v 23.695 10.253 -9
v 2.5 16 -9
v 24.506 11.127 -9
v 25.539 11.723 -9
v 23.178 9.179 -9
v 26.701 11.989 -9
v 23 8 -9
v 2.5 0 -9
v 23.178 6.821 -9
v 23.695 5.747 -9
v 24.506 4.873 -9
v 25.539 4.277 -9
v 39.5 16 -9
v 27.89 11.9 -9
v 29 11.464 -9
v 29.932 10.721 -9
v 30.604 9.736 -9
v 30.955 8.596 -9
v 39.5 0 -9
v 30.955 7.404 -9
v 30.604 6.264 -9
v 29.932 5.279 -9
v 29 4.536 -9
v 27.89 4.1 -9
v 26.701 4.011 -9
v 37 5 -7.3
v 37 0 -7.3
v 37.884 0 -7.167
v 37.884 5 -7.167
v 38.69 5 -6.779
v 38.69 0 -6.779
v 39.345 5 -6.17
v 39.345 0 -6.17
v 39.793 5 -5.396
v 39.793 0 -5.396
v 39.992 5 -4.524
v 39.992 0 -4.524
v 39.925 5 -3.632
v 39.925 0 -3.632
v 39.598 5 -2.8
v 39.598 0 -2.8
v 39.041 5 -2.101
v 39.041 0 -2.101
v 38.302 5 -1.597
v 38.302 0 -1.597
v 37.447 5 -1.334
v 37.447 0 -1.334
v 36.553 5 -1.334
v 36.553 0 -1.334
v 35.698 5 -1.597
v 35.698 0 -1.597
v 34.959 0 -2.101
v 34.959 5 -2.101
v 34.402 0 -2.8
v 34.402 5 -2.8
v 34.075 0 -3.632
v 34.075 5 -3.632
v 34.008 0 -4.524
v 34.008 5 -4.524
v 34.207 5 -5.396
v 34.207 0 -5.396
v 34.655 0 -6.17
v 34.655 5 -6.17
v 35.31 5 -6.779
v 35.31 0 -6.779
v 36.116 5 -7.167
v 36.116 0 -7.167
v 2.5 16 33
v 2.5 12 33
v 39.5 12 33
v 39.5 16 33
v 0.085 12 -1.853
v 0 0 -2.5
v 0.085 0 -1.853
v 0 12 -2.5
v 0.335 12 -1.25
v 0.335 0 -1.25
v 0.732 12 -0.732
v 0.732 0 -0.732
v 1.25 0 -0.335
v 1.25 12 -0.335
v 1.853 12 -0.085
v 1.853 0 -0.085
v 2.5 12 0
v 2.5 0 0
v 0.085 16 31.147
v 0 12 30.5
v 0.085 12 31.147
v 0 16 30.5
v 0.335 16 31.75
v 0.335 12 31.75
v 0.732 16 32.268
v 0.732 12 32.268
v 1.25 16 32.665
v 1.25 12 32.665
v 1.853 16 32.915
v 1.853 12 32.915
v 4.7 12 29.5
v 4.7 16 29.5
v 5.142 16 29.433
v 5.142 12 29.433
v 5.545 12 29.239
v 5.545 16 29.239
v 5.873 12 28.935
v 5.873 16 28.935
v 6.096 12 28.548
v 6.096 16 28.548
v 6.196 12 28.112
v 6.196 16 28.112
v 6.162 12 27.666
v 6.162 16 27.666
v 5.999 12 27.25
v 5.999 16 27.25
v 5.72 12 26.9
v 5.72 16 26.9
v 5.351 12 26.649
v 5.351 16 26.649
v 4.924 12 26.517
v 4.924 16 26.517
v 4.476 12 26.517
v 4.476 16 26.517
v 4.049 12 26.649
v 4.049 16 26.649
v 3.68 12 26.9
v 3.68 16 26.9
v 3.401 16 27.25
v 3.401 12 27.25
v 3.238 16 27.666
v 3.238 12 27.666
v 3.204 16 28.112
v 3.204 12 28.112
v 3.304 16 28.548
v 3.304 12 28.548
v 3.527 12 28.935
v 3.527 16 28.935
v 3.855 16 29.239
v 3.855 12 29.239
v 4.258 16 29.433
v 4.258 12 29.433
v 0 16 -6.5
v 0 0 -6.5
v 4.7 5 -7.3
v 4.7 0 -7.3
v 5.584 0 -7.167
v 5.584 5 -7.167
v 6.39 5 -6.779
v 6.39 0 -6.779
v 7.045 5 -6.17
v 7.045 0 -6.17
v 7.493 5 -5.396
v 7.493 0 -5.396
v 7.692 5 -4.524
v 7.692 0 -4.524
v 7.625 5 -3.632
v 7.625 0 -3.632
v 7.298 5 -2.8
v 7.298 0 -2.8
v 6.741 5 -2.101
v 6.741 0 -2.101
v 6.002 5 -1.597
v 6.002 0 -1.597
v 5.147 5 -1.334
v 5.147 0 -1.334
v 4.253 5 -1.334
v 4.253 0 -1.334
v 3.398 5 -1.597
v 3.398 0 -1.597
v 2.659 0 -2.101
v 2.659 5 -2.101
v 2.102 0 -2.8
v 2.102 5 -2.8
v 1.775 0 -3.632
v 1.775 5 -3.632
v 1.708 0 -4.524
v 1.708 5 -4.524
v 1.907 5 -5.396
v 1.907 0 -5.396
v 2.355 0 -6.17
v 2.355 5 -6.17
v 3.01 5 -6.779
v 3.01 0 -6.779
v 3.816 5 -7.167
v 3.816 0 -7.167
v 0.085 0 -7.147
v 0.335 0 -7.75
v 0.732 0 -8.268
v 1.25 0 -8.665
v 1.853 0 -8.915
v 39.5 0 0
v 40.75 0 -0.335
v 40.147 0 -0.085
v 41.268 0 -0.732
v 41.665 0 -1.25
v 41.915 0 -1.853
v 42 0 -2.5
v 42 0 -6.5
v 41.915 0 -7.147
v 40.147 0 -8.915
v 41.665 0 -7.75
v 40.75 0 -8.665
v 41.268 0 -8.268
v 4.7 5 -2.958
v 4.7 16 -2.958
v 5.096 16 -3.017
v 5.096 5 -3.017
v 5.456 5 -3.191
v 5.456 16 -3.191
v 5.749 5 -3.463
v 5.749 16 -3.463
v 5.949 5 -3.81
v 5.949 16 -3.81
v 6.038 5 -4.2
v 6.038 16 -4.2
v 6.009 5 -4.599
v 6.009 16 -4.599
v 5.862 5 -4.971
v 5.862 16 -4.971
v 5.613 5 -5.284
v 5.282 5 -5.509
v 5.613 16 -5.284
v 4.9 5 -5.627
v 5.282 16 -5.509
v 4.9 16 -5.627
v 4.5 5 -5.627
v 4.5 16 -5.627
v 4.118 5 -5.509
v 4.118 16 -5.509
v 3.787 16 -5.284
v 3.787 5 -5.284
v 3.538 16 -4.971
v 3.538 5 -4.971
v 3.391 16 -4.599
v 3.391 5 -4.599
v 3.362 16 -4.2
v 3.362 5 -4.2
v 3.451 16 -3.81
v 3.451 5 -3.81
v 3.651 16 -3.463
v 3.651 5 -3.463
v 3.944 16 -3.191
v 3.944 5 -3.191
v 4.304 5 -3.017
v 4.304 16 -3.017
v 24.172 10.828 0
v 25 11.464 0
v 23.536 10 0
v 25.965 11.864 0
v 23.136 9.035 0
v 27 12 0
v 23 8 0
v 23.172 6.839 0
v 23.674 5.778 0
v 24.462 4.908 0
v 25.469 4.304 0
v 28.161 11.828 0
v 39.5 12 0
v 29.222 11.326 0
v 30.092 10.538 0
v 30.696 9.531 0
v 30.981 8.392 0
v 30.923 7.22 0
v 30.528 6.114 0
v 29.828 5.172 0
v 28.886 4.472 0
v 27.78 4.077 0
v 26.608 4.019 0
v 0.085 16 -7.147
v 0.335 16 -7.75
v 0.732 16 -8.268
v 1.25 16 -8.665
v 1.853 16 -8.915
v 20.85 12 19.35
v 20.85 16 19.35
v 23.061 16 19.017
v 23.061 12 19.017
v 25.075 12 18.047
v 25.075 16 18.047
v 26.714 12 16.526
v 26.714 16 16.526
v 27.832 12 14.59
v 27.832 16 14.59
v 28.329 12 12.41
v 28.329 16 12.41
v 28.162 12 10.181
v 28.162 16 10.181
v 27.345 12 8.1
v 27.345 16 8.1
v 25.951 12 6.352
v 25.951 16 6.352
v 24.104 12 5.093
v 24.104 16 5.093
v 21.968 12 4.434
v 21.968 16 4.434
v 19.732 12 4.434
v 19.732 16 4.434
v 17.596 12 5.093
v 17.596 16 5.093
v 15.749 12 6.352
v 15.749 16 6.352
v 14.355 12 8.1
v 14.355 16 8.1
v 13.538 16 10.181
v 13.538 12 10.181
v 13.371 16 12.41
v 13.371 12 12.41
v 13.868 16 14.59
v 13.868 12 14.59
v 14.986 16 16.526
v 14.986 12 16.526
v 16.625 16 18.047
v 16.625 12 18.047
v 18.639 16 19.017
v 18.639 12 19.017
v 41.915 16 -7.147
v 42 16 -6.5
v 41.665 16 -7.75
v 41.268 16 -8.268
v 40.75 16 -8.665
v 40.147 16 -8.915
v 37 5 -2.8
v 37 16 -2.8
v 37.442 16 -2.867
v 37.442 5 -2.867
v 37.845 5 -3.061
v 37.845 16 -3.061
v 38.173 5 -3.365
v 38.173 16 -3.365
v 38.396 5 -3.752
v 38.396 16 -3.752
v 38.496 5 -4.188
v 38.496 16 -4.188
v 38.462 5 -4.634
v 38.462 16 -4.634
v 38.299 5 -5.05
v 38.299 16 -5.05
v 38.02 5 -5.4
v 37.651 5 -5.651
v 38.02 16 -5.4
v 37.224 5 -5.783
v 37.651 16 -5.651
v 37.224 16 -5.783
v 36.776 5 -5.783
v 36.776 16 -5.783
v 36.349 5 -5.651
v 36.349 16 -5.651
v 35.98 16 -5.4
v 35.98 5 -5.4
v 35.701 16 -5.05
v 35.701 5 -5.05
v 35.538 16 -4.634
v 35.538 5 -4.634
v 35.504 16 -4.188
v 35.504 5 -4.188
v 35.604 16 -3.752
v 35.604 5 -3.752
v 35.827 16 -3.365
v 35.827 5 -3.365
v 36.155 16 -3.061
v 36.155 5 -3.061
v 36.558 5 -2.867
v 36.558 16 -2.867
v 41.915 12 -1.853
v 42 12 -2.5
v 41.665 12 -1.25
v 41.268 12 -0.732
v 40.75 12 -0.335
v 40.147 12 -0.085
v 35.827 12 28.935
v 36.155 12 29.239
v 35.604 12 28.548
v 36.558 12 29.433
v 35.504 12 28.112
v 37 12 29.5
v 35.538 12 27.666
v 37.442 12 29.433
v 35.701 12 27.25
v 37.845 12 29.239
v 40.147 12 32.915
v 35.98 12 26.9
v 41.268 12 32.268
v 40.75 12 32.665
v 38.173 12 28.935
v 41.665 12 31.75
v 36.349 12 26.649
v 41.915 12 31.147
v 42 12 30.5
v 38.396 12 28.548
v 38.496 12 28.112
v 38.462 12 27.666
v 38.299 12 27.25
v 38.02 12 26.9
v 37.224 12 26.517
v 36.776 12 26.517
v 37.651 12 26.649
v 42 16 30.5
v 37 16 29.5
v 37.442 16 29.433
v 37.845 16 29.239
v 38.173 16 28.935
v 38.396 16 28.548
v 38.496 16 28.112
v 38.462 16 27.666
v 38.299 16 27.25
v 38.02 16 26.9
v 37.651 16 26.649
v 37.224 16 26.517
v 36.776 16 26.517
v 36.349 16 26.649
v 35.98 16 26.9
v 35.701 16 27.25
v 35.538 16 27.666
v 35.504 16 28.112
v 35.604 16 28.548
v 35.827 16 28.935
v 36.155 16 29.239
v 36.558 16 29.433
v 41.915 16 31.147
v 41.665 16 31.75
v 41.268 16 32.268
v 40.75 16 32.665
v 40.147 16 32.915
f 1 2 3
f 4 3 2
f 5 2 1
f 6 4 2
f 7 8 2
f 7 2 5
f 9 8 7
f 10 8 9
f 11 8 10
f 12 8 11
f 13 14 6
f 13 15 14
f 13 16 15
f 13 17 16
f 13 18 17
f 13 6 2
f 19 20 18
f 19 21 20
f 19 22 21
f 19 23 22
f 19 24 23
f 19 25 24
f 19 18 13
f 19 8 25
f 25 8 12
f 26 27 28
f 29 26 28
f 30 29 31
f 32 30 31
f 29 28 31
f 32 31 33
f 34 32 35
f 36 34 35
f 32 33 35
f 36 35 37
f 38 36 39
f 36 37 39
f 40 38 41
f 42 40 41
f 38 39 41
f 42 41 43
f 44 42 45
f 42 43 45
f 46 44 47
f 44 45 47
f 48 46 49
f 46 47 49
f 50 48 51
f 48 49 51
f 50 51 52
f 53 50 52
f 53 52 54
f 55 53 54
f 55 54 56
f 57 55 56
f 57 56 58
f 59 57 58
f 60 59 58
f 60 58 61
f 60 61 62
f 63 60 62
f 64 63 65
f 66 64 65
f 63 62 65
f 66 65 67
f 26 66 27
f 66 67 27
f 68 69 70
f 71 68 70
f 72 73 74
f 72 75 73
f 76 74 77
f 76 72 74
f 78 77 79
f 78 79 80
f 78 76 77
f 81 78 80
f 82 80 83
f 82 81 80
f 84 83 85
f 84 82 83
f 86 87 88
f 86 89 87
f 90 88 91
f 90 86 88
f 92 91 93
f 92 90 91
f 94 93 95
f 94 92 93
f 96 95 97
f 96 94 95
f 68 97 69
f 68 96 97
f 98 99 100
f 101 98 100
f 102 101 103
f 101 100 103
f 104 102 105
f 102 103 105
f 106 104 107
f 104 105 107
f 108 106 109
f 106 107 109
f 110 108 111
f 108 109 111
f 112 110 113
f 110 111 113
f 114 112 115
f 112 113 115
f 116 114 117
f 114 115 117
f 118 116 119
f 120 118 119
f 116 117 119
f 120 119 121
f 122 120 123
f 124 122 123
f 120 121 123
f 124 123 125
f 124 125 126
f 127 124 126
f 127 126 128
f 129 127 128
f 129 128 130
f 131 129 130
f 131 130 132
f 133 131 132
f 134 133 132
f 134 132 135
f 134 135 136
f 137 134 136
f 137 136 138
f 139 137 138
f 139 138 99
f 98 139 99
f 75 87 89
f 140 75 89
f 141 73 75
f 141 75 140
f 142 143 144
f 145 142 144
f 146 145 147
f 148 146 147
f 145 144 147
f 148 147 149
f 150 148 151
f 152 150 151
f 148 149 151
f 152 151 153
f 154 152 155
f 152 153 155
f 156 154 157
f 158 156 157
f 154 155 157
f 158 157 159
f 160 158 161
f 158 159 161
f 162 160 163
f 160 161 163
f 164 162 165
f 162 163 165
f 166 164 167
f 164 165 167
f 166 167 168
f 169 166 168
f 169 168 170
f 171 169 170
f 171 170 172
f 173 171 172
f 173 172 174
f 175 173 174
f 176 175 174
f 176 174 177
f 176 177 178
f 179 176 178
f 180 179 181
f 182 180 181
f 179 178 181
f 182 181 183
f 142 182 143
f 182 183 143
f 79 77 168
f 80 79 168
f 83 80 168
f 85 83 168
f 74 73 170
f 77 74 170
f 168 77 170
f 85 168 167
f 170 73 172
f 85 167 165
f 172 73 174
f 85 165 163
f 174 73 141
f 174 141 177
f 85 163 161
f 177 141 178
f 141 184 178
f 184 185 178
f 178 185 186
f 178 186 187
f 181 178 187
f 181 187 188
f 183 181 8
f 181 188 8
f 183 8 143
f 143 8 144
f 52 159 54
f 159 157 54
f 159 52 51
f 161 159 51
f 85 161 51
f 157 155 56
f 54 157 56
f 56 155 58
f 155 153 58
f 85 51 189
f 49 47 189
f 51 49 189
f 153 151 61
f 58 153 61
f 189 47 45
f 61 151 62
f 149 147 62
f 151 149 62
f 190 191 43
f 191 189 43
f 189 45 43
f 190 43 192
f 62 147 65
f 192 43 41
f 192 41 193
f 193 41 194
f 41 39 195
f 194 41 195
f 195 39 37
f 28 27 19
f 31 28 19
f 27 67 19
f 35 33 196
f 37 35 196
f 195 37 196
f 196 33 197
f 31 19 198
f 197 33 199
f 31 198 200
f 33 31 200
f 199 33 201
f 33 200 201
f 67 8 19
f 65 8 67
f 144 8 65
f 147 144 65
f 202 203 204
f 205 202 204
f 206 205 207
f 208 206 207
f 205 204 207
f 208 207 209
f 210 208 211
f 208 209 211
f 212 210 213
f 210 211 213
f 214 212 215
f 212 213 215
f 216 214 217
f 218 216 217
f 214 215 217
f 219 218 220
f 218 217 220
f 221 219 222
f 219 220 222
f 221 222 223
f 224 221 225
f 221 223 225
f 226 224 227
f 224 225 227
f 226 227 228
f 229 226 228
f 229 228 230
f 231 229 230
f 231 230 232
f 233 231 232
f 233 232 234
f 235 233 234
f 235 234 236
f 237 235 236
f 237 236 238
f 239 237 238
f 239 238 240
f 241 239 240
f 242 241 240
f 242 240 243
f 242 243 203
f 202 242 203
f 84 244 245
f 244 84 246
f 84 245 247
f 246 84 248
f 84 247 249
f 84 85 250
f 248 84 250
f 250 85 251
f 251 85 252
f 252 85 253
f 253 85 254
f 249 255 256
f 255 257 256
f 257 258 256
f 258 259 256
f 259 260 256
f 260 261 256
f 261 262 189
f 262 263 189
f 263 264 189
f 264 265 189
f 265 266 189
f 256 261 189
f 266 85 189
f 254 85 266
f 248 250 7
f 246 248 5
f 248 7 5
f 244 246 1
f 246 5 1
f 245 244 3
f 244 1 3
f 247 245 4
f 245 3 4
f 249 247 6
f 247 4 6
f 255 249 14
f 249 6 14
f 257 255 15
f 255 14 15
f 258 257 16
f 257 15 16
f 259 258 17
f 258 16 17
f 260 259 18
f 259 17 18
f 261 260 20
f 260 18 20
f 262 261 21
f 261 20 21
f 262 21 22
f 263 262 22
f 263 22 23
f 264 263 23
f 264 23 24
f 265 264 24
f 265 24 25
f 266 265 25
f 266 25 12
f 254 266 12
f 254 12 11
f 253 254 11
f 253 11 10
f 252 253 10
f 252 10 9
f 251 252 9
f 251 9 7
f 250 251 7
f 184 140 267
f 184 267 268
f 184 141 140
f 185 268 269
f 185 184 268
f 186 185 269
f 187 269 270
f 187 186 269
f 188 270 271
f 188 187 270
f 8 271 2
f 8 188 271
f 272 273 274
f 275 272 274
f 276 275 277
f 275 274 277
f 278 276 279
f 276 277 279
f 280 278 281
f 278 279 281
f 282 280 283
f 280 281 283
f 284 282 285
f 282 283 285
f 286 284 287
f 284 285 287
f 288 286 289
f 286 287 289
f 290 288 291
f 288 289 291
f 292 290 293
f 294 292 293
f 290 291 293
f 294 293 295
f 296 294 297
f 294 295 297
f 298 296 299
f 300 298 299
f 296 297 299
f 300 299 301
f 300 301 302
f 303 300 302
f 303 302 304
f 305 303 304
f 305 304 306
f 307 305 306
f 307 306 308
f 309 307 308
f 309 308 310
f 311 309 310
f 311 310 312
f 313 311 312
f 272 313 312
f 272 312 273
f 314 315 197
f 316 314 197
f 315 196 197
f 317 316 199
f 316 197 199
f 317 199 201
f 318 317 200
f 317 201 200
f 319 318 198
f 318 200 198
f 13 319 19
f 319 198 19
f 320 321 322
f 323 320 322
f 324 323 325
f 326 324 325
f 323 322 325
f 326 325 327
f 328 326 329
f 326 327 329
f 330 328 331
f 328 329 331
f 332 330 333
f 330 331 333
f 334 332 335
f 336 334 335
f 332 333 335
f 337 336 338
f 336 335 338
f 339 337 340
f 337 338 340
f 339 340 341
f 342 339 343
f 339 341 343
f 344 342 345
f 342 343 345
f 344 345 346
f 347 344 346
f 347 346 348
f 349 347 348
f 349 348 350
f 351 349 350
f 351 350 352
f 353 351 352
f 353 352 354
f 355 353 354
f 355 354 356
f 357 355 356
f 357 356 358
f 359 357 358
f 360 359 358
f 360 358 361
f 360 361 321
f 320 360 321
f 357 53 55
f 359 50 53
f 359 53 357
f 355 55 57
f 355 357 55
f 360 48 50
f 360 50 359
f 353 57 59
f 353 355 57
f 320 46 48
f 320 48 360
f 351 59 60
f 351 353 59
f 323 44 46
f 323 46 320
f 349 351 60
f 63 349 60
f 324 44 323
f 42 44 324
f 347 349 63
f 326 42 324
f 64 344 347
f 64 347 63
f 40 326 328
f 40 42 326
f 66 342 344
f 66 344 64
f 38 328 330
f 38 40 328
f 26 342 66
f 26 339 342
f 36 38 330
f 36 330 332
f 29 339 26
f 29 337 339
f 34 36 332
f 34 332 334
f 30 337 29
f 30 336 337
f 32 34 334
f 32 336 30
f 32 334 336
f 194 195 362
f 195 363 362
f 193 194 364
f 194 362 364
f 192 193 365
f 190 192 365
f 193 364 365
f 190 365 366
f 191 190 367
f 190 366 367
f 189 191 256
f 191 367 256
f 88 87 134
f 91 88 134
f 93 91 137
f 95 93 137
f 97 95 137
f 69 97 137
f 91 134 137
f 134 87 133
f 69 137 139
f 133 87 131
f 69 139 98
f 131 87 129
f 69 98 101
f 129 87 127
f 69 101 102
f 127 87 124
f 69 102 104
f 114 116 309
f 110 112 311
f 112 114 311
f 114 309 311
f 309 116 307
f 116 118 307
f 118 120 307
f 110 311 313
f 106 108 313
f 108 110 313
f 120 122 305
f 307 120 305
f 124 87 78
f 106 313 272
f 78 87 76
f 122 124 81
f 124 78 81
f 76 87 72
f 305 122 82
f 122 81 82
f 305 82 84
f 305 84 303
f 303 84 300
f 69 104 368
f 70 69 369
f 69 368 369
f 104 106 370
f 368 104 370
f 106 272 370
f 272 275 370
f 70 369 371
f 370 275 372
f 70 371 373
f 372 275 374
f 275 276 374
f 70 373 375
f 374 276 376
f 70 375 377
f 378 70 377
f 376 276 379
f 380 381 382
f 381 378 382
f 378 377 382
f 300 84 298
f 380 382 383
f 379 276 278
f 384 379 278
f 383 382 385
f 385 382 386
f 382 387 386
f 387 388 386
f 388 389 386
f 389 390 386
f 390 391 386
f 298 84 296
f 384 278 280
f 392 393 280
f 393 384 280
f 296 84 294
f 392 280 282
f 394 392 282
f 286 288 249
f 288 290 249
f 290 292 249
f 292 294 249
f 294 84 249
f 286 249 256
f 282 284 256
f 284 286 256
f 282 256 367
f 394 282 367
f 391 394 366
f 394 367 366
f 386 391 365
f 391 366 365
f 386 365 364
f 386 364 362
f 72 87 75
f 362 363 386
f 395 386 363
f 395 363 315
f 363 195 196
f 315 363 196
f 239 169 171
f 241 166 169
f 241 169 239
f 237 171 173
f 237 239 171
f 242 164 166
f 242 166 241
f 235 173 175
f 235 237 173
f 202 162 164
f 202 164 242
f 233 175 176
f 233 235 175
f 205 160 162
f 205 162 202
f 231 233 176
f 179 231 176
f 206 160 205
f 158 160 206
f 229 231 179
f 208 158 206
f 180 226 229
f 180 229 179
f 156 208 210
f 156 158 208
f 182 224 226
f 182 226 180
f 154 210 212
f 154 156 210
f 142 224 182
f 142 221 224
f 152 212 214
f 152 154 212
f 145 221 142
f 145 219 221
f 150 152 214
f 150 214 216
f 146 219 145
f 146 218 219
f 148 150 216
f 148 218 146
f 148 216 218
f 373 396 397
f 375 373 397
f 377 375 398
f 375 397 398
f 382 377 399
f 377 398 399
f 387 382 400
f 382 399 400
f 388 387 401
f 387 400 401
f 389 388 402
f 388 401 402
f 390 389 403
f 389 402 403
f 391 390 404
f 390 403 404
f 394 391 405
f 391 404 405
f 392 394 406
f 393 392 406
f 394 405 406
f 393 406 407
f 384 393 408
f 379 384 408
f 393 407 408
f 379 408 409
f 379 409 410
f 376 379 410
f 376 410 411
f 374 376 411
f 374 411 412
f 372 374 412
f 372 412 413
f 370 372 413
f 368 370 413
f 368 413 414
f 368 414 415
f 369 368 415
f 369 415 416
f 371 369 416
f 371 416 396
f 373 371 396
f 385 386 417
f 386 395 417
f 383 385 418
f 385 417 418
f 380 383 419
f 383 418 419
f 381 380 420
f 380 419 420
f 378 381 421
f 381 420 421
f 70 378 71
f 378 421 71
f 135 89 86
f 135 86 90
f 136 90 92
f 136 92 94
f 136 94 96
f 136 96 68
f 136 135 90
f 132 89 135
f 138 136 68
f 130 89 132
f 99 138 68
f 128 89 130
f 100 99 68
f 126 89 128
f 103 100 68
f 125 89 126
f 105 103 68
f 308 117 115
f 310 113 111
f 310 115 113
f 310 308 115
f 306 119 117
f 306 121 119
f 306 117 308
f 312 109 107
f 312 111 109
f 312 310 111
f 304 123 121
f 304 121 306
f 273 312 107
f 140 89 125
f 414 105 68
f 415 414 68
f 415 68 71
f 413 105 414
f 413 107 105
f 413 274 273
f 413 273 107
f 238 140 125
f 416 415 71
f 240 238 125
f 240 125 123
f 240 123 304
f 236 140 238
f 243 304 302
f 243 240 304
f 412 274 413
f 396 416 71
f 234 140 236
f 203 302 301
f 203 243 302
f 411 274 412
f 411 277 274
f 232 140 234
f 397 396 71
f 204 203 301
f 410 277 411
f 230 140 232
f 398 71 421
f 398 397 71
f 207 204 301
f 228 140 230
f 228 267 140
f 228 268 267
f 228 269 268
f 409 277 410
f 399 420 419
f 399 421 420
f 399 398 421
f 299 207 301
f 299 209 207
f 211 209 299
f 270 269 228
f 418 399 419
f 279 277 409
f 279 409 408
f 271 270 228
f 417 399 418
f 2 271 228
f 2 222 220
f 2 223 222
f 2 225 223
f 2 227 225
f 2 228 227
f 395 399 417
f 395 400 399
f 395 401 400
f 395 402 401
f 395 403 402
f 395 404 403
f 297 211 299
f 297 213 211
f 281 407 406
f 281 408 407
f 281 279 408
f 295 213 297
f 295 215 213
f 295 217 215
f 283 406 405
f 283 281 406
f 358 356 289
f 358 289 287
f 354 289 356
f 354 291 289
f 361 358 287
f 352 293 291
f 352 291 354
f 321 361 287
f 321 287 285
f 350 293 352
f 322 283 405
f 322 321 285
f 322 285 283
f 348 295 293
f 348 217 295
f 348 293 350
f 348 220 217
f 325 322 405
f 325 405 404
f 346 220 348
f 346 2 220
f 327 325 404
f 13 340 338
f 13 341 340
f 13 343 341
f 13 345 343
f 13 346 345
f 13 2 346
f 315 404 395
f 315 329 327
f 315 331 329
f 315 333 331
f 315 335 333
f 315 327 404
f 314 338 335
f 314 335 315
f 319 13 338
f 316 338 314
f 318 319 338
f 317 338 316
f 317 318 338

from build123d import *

# Parameters (mm, degrees)
SKETCH1_W           = 42
SKETCH1_H           = 9
BOSS_EXTRUDE1_DEPTH = 12
SKETCH2_W           = 42
SKETCH2_H           = 42
BOSS_EXTRUDE2_DEPTH = 4
FILLET1_R           = 2.5
FILLET2_R           = 2.5
FILLET3_R           = 2.5
FILLET4_R           = 2.5
FILLET5_R           = 2.5
FILLET6_R           = 2.5
SKETCH3_R           = 7.5
SKETCH3_R_2         = 1.5
SKETCH3_R_3         = 1.342252065
CUT_EXTRUDE1_DEPTH  = 20
SKETCH4_R           = 3
CUT_EXTRUDE2_DEPTH  = 5
SKETCH5_R           = 4
CUT_EXTRUDE3_DEPTH  = 9


with BuildPart() as part:
    # Sketch1 → Boss-Extrude1 (new body)
    with BuildSketch(Plane(origin=(0, 0, 0), x_dir=(1, 0, 0), z_dir=(0, 1, 0))):
        with Locations((21, 4.5)):
            Rectangle(SKETCH1_W, SKETCH1_H)
    extrude(amount=BOSS_EXTRUDE1_DEPTH)

    # Sketch2 → Boss-Extrude2 (add)
    with BuildSketch(Plane(origin=(0, 12, 0), x_dir=(1, 0, 0), z_dir=(0, 1, 0))):
        with Locations((21, -12)):
            Rectangle(SKETCH2_W, SKETCH2_H)
    extrude(amount=BOSS_EXTRUDE2_DEPTH)

    # Fillet1
    fillet1_edges = [part.edges().sort_by_distance(p)[0] for p in [
        (0, 14, 33),
    ]]
    fillet(fillet1_edges, radius=FILLET1_R)

    # Fillet2
    fillet2_edges = [part.edges().sort_by_distance(p)[0] for p in [
        (0, 8, -9),
    ]]
    fillet(fillet2_edges, radius=FILLET2_R)

    # Fillet3
    fillet3_edges = [part.edges().sort_by_distance(p)[0] for p in [
        (0, 6, 0),
    ]]
    fillet(fillet3_edges, radius=FILLET3_R)

    # Fillet4
    fillet4_edges = [part.edges().sort_by_distance(p)[0] for p in [
        (42, 14, 33),
    ]]
    fillet(fillet4_edges, radius=FILLET4_R)

    # Fillet5
    fillet5_edges = [part.edges().sort_by_distance(p)[0] for p in [
        (42, 6, 0),
    ]]
    fillet(fillet5_edges, radius=FILLET5_R)

    # Fillet6
    fillet6_edges = [part.edges().sort_by_distance(p)[0] for p in [
        (42, 8, -9),
    ]]
    fillet(fillet6_edges, radius=FILLET6_R)

    # Sketch3 → Cut-Extrude1 (cut)
    with BuildSketch(Plane(origin=(0, 16, 0), x_dir=(1, 0, 0), z_dir=(0, 1, 0))):
        with Locations(Location((20.85, -11.85, 0), (0, 0, 270))):
            Circle(SKETCH3_R)
        with Locations(Location((4.7, -28, 0), (0, 0, 270))):
            Circle(SKETCH3_R_2)
        with Locations(Location((37, -28, 0), (0, 0, 270))):
            Circle(SKETCH3_R_2)
        with Locations(Location((37, 4.3, 0), (0, 0, 270))):
            Circle(SKETCH3_R_2)
        with Locations(Location((4.7, 4.3, 0), (0, 0, 270))):
            Circle(SKETCH3_R_3)
    extrude(amount=-CUT_EXTRUDE1_DEPTH, mode=Mode.SUBTRACT)

    # Sketch4 → Cut-Extrude2 (cut)
    with BuildSketch(Plane.XZ):
        with Locations(Location((4.7, -4.3, 0), (0, 0, 270))):
            Circle(SKETCH4_R)
        with Locations(Location((37, -4.3, 0), (0, 0, 270))):
            Circle(SKETCH4_R)
    extrude(amount=-CUT_EXTRUDE2_DEPTH, mode=Mode.SUBTRACT)

    # Sketch5 → Cut-Extrude3 (cut)
    with BuildSketch(Plane(origin=(0, 0, -9), x_dir=(-1, 0, 0), z_dir=(0, 0, -1))):
        with Locations((-27, 8)):
            Circle(SKETCH5_R)
    extrude(amount=-CUT_EXTRUDE3_DEPTH, mode=Mode.SUBTRACT)


solid = part.part
